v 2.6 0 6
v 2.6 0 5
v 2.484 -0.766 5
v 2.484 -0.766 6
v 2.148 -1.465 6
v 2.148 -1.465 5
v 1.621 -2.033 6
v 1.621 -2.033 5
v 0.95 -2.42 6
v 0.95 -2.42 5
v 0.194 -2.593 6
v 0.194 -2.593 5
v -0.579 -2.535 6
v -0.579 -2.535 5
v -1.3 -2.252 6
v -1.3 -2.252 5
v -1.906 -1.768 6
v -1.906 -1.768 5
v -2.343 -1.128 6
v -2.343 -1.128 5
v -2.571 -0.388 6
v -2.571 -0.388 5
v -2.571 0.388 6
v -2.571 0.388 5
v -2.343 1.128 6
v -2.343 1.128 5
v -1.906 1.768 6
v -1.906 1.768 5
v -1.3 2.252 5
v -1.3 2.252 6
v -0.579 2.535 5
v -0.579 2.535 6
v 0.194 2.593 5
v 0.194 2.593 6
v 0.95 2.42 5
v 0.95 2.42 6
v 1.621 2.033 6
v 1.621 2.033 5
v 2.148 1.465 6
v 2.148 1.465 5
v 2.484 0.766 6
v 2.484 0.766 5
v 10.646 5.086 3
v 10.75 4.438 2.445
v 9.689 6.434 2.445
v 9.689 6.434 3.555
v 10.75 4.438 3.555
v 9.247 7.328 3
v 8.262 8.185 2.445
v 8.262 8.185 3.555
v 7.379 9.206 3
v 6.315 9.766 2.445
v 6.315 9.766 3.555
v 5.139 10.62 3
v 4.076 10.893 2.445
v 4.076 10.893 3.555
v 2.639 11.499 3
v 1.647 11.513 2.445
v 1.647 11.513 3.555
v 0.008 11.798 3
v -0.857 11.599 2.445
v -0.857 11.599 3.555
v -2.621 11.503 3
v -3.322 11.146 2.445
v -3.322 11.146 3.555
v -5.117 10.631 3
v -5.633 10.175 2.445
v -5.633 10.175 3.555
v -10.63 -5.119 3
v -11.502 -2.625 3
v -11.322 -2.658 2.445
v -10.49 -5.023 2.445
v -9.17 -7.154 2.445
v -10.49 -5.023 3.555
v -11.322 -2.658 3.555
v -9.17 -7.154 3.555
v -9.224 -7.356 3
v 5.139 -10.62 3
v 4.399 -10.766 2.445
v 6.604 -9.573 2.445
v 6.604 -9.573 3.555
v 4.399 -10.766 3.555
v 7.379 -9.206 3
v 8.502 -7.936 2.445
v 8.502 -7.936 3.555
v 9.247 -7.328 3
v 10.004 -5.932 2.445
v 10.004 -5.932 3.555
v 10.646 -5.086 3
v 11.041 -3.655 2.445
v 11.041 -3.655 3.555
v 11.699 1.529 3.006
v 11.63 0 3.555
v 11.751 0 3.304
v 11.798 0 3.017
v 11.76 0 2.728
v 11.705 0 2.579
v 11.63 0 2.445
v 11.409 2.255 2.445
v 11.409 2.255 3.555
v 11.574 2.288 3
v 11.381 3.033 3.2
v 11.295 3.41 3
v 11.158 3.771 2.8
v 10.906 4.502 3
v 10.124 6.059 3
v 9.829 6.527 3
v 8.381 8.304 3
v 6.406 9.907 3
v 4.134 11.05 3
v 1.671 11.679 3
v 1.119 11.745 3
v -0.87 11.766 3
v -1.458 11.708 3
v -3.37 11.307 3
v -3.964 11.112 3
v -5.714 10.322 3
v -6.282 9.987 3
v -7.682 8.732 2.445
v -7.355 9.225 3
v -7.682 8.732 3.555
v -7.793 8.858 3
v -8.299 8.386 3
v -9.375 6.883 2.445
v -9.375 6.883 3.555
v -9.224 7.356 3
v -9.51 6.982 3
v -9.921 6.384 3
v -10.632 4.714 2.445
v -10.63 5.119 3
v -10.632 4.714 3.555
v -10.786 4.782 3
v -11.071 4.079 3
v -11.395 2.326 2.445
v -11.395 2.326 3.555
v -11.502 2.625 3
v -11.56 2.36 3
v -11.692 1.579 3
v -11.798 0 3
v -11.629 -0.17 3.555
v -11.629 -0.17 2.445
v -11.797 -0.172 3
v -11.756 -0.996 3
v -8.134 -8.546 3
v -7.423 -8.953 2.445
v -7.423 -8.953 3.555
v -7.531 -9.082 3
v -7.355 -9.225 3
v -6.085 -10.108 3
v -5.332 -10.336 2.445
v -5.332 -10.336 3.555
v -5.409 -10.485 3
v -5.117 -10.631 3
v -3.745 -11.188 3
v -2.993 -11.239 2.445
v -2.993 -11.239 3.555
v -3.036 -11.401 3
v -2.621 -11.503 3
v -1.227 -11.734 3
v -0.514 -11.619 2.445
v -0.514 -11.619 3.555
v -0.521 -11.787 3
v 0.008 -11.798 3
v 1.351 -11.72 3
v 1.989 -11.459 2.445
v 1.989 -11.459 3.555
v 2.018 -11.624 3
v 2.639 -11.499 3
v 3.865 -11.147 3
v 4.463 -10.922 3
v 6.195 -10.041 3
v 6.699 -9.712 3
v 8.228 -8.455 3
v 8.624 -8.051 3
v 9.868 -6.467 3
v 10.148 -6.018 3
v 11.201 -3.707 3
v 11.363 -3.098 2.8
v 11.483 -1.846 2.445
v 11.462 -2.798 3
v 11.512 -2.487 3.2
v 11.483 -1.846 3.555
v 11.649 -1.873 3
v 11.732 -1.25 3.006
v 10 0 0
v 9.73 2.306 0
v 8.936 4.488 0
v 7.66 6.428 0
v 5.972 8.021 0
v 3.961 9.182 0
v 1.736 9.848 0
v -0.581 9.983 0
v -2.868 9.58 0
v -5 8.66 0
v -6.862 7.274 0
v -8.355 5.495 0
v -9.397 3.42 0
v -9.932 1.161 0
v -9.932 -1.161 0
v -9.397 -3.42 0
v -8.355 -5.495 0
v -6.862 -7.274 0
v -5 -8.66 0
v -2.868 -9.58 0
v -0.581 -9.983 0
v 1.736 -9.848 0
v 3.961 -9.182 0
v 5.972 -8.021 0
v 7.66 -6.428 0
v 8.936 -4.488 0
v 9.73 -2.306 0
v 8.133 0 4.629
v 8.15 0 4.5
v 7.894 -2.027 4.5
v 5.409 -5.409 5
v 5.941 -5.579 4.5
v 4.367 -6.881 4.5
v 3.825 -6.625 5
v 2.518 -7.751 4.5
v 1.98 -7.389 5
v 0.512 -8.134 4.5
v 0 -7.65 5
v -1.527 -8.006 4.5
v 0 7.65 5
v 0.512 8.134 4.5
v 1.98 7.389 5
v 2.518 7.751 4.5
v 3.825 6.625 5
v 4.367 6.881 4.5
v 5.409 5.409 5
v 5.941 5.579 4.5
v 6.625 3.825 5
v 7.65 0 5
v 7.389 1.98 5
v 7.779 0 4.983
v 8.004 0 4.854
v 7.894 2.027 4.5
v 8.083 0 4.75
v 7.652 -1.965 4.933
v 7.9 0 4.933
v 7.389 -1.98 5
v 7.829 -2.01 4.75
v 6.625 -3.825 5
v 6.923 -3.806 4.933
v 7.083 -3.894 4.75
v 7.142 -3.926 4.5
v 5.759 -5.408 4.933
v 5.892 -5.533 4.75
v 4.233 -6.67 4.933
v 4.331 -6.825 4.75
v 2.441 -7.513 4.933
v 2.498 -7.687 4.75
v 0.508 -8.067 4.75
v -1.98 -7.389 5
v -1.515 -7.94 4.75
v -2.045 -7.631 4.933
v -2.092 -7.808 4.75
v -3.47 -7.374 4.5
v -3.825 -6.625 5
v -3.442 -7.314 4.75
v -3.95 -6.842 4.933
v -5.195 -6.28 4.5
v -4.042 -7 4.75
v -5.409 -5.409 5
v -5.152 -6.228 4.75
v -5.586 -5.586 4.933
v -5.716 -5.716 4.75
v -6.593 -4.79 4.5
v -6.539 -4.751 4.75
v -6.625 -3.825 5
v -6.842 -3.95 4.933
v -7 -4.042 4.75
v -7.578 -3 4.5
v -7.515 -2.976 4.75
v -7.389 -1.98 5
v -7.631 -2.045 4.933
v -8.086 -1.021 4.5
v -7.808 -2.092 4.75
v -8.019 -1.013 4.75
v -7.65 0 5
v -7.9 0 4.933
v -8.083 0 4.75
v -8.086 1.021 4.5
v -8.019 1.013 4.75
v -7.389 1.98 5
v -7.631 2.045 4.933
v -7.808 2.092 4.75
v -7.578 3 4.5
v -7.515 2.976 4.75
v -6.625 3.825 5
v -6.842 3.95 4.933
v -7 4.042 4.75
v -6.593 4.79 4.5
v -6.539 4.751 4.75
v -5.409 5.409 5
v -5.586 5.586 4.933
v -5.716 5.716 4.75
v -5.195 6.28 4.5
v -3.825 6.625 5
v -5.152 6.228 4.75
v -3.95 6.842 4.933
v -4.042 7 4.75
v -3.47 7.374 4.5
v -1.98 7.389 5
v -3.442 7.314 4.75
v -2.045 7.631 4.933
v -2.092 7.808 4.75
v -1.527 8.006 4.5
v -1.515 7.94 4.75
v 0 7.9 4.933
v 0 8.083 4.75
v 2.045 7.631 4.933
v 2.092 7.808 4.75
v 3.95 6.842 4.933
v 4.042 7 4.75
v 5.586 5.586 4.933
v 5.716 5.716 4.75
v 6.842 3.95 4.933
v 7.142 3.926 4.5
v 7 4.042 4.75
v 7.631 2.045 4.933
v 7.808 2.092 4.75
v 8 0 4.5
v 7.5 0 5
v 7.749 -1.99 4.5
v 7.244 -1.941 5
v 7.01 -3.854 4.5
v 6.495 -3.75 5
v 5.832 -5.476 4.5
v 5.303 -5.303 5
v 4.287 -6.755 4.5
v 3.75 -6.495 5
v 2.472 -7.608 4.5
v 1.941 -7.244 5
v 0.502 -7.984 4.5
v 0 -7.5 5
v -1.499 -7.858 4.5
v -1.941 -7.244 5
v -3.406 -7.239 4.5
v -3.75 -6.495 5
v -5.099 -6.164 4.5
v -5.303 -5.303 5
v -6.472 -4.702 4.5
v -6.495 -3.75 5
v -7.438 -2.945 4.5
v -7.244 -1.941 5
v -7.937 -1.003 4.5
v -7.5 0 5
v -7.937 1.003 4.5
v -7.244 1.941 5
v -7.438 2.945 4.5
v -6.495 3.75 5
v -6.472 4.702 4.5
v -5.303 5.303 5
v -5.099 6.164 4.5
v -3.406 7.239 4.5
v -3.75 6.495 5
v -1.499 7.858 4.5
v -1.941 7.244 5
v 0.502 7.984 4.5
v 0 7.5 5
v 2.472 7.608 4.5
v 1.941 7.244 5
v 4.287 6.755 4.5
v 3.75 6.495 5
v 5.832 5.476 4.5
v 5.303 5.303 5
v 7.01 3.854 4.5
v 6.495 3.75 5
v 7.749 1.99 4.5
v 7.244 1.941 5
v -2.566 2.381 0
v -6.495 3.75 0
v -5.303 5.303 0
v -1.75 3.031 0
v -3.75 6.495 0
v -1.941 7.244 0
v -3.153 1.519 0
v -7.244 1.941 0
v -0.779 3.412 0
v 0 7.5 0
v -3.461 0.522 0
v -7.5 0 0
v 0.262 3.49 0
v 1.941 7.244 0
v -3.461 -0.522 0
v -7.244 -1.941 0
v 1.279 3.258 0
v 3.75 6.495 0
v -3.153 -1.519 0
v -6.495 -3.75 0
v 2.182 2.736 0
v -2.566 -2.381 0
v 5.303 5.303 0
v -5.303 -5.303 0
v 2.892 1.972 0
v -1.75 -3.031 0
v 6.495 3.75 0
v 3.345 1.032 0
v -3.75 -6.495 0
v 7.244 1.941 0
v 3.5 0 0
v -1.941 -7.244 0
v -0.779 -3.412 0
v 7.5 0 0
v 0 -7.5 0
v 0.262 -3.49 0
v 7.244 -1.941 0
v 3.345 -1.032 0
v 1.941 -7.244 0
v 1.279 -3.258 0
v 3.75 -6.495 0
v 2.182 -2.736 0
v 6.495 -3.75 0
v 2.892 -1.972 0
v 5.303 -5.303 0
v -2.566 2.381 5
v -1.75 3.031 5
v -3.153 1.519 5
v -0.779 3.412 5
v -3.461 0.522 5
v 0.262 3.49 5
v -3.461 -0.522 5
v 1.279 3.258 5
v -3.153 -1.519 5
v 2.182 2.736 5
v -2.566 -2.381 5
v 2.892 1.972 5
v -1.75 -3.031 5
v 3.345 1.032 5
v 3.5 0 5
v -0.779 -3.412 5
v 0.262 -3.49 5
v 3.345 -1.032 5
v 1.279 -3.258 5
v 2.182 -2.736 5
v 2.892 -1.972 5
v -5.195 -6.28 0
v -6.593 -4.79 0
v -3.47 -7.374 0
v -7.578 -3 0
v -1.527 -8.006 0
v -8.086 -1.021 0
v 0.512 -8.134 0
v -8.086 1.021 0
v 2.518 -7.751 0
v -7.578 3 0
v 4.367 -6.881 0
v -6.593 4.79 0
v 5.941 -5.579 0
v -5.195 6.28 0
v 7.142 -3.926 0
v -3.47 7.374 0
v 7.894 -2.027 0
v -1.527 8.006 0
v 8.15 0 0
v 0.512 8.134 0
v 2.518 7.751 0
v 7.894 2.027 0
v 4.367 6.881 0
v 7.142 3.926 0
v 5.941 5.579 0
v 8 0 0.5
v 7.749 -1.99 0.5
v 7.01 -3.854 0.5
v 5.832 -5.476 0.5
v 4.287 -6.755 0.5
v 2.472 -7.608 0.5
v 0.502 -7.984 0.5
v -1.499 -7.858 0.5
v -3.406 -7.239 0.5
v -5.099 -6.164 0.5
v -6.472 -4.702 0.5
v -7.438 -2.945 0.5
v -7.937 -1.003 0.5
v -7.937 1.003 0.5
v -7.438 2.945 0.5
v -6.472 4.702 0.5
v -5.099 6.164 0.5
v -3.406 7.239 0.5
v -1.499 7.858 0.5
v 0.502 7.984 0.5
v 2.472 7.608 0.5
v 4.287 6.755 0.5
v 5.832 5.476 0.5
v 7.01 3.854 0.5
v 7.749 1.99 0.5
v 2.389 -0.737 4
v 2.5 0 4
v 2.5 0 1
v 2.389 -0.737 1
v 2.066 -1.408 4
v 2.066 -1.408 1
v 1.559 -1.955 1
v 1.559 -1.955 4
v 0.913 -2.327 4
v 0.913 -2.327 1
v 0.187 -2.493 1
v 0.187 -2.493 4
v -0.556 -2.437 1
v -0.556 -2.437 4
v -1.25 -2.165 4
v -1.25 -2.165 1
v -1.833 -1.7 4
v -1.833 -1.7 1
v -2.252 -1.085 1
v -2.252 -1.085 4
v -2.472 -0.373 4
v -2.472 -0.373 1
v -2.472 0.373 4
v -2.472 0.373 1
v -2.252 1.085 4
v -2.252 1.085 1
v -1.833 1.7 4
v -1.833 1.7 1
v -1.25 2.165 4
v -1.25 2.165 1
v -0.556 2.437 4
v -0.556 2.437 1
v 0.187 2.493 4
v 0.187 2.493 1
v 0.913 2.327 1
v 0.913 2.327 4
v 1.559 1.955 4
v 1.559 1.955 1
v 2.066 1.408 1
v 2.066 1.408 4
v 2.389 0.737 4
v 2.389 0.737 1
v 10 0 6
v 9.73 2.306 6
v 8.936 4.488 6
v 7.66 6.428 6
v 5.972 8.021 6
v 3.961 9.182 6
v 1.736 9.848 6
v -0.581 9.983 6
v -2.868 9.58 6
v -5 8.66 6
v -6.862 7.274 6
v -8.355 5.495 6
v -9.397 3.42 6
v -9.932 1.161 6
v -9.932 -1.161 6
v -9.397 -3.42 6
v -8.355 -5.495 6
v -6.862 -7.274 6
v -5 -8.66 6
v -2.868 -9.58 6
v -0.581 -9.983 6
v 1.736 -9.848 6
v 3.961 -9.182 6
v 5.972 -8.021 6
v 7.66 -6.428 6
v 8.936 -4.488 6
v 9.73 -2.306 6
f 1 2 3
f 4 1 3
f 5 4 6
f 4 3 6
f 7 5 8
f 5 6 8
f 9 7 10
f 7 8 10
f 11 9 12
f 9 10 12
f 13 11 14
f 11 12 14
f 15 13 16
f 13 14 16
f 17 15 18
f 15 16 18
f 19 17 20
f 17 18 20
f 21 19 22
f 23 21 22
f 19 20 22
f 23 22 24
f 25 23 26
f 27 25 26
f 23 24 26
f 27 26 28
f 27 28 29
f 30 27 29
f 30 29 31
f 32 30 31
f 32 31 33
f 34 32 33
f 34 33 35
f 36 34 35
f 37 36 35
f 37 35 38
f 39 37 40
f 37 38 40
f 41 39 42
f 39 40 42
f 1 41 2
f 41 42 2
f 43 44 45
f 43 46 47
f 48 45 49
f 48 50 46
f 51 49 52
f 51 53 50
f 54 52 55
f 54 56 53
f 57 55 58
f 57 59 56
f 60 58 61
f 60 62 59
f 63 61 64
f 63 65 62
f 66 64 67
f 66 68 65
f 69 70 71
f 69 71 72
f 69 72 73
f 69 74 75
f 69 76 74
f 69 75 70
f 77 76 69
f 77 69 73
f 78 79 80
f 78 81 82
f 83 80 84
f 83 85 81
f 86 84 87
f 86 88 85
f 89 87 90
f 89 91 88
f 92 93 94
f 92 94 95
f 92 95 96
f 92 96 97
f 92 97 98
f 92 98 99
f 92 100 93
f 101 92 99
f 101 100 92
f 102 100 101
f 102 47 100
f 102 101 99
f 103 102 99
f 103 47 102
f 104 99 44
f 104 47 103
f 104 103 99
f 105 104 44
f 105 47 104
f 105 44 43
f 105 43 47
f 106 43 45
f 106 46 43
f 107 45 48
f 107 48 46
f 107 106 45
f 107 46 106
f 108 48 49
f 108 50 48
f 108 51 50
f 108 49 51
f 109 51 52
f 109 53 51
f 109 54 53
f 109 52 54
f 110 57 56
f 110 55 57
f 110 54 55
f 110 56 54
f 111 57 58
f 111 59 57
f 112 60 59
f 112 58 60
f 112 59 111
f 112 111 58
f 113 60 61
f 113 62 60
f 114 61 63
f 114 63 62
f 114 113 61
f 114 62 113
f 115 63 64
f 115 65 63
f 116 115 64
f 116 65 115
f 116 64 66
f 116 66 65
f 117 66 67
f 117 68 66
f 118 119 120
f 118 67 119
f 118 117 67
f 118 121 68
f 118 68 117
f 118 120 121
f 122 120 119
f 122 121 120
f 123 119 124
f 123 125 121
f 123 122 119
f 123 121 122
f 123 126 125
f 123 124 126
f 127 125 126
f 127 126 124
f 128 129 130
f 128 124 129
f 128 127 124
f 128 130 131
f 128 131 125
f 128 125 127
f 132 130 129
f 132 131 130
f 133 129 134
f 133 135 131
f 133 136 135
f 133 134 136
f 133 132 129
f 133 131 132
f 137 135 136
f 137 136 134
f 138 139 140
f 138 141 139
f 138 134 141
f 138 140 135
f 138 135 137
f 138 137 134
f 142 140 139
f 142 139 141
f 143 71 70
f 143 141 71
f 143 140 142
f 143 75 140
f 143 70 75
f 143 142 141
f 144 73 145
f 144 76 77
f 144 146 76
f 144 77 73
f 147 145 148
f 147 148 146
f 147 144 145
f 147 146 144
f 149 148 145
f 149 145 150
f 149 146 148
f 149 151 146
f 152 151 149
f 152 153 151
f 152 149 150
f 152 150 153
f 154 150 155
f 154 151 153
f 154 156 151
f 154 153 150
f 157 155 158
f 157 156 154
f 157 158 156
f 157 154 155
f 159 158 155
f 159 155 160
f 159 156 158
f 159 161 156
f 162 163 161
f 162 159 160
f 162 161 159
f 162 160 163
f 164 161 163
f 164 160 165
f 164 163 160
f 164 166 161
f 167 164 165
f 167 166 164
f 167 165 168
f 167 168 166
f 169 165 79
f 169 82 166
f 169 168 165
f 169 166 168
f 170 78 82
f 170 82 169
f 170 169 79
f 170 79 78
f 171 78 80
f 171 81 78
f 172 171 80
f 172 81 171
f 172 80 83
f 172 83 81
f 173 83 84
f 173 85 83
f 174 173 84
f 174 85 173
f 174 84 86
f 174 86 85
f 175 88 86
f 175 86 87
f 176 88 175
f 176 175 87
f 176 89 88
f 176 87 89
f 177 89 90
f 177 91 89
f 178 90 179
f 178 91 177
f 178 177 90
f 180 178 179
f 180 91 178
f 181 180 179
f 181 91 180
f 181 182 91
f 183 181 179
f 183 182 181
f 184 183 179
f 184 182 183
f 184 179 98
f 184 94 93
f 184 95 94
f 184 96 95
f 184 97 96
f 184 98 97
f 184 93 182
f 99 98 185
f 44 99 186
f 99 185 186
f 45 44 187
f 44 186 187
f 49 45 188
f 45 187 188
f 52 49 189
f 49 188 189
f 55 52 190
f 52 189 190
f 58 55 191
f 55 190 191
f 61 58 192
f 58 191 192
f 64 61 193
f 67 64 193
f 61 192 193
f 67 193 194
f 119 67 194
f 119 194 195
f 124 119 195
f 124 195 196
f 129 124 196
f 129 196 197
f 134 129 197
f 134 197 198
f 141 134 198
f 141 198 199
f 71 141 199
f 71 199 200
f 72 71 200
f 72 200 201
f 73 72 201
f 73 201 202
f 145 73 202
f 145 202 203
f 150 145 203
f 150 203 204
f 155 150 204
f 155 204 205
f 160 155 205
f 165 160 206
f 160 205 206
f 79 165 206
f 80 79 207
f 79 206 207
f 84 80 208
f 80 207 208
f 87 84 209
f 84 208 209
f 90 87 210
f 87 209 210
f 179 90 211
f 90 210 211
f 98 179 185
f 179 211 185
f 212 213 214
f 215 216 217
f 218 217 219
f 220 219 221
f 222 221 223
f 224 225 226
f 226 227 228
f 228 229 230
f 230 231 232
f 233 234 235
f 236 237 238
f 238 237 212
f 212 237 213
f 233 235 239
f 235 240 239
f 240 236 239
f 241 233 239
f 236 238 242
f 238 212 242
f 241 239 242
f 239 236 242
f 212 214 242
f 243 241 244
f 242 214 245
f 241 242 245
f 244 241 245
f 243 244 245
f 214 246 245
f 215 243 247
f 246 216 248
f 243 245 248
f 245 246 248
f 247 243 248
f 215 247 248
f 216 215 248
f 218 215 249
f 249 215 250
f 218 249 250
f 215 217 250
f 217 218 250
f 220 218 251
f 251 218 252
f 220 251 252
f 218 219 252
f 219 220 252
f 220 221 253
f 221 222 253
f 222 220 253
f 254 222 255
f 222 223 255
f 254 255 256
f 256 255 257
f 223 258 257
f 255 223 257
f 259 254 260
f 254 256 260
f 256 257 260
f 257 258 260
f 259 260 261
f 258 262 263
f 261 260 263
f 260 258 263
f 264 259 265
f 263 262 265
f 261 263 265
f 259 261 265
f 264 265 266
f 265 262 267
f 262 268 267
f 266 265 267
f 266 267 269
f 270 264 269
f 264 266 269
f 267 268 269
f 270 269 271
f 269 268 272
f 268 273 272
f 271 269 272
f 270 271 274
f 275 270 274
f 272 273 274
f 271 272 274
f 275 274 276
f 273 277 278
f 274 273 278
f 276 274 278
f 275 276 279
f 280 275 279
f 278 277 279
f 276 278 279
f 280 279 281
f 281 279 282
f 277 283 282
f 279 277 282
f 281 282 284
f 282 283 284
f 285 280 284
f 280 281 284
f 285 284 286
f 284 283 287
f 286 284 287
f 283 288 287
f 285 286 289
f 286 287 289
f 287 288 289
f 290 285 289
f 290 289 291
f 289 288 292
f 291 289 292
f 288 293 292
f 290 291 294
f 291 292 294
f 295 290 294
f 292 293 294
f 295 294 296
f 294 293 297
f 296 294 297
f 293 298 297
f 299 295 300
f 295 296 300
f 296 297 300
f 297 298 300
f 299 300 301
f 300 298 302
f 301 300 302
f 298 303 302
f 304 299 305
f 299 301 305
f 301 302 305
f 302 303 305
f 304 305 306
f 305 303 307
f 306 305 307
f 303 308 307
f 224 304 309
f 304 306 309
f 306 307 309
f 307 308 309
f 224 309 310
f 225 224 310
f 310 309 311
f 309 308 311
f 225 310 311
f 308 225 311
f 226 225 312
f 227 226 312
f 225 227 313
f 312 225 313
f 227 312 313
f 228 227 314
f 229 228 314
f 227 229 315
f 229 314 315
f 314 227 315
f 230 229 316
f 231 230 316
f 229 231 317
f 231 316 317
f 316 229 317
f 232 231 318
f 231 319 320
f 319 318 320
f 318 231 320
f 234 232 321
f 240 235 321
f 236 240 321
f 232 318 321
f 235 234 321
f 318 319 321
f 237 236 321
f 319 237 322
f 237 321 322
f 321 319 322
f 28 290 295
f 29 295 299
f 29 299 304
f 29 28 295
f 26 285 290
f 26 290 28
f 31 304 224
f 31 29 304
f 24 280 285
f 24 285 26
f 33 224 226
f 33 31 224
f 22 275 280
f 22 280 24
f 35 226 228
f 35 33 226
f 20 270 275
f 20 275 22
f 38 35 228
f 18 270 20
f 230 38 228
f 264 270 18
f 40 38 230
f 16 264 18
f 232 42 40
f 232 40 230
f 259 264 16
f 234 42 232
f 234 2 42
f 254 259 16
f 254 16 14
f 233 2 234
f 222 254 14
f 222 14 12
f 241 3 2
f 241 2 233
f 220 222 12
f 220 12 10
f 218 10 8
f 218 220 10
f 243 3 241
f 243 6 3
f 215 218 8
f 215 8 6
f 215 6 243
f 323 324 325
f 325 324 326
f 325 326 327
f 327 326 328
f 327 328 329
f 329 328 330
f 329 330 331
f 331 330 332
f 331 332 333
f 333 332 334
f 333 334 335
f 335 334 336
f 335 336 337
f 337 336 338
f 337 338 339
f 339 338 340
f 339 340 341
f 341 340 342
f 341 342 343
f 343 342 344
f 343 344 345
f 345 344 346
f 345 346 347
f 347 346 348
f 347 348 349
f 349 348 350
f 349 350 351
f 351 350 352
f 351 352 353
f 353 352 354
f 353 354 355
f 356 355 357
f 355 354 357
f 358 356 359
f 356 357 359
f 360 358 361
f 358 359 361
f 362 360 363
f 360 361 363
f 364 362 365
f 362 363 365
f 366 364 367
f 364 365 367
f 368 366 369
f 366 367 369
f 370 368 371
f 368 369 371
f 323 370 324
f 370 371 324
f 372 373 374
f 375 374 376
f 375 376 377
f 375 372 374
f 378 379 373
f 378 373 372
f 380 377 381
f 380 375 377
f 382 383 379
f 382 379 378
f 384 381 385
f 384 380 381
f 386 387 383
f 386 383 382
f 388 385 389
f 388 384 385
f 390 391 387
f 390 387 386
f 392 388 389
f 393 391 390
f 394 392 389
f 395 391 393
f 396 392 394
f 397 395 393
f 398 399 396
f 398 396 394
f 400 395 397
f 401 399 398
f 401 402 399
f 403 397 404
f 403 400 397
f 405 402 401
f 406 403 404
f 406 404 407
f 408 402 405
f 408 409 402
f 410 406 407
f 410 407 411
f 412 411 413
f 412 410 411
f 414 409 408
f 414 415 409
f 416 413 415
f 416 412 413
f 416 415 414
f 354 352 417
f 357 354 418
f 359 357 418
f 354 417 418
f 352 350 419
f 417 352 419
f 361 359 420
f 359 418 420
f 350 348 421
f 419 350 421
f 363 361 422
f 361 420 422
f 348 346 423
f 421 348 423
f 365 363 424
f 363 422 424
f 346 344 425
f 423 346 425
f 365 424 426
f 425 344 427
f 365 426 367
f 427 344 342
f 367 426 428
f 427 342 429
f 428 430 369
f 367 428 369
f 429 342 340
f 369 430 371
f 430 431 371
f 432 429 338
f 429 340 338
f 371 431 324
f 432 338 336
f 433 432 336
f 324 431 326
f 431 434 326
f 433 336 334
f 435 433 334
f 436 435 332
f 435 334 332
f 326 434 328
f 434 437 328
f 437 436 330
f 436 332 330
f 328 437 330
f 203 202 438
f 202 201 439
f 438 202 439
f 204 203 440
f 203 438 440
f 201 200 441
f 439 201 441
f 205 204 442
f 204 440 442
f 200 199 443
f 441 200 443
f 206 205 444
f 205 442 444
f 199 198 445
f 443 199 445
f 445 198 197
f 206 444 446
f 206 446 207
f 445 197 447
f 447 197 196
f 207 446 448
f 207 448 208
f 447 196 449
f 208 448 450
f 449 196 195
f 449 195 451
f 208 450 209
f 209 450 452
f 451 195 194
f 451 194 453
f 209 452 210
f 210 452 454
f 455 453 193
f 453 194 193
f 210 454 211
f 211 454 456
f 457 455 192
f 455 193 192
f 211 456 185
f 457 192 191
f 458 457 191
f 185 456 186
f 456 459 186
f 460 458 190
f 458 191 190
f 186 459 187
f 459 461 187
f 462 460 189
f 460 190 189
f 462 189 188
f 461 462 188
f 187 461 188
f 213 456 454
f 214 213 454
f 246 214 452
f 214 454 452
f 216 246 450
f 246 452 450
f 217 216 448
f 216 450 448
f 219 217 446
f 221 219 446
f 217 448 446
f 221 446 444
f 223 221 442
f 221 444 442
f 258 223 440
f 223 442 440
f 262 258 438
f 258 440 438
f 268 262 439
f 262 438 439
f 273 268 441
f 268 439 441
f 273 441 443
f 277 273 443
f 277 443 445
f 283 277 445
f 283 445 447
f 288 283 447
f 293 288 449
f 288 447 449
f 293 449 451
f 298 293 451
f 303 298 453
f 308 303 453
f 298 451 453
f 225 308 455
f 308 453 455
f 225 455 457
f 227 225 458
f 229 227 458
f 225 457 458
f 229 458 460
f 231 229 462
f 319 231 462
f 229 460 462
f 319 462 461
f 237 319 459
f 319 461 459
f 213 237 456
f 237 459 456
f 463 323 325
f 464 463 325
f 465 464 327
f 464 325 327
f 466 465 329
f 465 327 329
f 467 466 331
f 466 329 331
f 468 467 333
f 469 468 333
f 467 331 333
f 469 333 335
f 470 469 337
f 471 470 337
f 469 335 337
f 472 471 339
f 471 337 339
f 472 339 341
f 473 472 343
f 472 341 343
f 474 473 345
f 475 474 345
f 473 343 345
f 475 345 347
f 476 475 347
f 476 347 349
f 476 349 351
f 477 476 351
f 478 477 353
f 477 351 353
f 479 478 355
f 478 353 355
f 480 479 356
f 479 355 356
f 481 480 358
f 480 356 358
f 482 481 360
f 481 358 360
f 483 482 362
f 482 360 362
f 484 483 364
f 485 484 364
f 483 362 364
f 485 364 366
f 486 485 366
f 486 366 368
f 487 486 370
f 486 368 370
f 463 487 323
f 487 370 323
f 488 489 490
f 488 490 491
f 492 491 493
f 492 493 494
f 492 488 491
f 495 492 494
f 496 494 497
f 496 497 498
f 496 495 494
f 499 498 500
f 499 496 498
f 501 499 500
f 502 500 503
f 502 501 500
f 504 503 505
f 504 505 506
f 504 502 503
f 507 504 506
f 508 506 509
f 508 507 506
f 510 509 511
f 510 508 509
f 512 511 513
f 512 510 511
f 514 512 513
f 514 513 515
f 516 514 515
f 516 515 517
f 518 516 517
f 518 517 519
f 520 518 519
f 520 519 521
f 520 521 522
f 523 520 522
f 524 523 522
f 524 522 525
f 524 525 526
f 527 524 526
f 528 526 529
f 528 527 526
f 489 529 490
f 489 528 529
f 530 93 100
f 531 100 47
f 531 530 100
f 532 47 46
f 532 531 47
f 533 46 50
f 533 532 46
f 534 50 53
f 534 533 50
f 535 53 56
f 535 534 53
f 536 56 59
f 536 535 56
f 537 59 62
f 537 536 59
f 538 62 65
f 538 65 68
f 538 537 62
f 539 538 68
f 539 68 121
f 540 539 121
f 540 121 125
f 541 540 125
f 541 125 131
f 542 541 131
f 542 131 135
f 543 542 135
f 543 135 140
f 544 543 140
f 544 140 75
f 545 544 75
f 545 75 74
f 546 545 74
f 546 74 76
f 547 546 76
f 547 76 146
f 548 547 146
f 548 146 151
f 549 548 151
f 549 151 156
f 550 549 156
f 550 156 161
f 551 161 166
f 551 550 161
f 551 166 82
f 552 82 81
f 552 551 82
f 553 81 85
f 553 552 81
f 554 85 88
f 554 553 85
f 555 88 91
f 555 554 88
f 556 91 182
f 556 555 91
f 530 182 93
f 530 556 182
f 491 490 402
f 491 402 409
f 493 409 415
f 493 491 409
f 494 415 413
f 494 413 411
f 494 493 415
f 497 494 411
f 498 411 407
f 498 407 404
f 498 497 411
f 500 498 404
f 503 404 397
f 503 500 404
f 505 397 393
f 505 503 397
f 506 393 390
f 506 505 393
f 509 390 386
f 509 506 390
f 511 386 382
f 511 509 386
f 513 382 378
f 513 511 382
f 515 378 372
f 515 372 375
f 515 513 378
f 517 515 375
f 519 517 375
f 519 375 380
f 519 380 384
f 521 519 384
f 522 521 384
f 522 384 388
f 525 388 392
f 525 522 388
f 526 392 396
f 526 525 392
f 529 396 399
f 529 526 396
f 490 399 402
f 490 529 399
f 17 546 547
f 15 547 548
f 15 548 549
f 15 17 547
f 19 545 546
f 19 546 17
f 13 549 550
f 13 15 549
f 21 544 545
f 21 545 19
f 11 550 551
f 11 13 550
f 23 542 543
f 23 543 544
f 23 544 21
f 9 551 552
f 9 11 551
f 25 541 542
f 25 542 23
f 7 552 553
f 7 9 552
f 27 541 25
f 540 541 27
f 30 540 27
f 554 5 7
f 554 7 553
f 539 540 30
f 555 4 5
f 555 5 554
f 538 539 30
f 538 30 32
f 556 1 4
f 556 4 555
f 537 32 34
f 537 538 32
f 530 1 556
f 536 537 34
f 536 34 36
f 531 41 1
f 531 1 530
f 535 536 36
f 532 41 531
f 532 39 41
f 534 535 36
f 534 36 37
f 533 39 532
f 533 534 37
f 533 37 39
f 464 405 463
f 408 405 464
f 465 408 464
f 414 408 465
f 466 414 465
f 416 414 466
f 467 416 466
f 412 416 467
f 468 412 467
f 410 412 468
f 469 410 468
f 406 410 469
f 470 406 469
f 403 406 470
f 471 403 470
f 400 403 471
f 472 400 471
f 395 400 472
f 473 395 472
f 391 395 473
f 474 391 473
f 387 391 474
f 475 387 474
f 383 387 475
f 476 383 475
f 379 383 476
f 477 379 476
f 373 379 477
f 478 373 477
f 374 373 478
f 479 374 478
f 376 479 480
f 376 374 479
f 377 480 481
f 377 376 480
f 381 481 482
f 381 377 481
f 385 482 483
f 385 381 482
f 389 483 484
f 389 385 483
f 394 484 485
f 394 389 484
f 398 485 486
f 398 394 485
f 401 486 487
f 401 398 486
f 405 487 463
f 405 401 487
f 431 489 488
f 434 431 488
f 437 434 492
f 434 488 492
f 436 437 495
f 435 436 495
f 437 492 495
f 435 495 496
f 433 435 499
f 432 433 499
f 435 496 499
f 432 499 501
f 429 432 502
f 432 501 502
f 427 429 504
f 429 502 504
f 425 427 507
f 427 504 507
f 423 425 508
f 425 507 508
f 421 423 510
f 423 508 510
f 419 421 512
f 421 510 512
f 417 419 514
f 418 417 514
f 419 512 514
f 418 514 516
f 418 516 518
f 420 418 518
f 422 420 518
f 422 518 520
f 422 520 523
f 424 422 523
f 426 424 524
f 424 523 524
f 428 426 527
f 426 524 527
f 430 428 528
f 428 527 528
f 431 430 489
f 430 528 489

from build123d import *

# Parameters (mm, degrees)
F2_R      = 12
F0_R      = 10
F5_R      = 8.15
F6_DEPTH  = 5
F7_R      = 2.6
F8_DEPTH  = 1
F9_R      = 1
F10_R     = 0.5
F11_R     = 8
F11_R_2   = 2.5
F12_DEPTH = 5
F13_SIZE  = 0.5
F14_SIZE  = 1


with BuildPart() as f3:
    # F2 (on offset) → F3 section 0
    with BuildSketch(Plane.XY.offset(3)):
        Circle(F2_R)
    # F0 (on Top) → F3 section 1
    with BuildSketch(Plane.XY):
        Circle(F0_R)
    loft()

    # F4: F3 across plane


with BuildPart() as f3_1:
    add(f3.part)
    add(f3.part.mirror(Plane.XY.offset(3)))

    # F5 (on face) → F6 (cut)
    with BuildSketch(Plane(origin=(0, 0, 0), x_dir=(1, 0, 0), z_dir=(0, 0, -1))):
        Circle(F5_R)
    extrude(amount=-F6_DEPTH, mode=Mode.SUBTRACT)

    # F7 (on face) → F8 (cut, through all)
    with BuildSketch(Plane(origin=(0, 0, 5), x_dir=(1, 0, 0), z_dir=(0, 0, -1))):
        Circle(F7_R)
    extrude(amount=-F8_DEPTH, mode=Mode.SUBTRACT)

    # F9
    f9_edges = [f3_1.edges().sort_by_distance(p)[0] for p in [
        (-12, 0, 3),
    ]]
    fillet(f9_edges, radius=F9_R)

    # F10
    f10_edges = [f3_1.edges().sort_by_distance(p)[0] for p in [
        (-8.15, 0, 5),
    ]]
    fillet(f10_edges, radius=F10_R)


with BuildPart() as f12:
    # F11 (on face) → F12 (new body)
    with BuildSketch(Plane(origin=(0, 0, 5), x_dir=(1, 0, 0), z_dir=(0, 0, -1))):
        Circle(F11_R)
        Circle(F11_R_2, mode=Mode.SUBTRACT)
    extrude(amount=F12_DEPTH)

    # F13
    f13_edges = [f12.edges().sort_by_distance(p)[0] for p in [
        (-8, 0, 0),
        (-8, 0, 5),
    ]]
    chamfer(f13_edges, length=F13_SIZE)

    # F14
    f14_edges = [f12.edges().sort_by_distance(p)[0] for p in [
        (-2.5, 0, 0),
        (-2.5, 0, 5),
    ]]
    chamfer(f14_edges, length=F14_SIZE)


solid = Compound([f3_1.part, f12.part])
